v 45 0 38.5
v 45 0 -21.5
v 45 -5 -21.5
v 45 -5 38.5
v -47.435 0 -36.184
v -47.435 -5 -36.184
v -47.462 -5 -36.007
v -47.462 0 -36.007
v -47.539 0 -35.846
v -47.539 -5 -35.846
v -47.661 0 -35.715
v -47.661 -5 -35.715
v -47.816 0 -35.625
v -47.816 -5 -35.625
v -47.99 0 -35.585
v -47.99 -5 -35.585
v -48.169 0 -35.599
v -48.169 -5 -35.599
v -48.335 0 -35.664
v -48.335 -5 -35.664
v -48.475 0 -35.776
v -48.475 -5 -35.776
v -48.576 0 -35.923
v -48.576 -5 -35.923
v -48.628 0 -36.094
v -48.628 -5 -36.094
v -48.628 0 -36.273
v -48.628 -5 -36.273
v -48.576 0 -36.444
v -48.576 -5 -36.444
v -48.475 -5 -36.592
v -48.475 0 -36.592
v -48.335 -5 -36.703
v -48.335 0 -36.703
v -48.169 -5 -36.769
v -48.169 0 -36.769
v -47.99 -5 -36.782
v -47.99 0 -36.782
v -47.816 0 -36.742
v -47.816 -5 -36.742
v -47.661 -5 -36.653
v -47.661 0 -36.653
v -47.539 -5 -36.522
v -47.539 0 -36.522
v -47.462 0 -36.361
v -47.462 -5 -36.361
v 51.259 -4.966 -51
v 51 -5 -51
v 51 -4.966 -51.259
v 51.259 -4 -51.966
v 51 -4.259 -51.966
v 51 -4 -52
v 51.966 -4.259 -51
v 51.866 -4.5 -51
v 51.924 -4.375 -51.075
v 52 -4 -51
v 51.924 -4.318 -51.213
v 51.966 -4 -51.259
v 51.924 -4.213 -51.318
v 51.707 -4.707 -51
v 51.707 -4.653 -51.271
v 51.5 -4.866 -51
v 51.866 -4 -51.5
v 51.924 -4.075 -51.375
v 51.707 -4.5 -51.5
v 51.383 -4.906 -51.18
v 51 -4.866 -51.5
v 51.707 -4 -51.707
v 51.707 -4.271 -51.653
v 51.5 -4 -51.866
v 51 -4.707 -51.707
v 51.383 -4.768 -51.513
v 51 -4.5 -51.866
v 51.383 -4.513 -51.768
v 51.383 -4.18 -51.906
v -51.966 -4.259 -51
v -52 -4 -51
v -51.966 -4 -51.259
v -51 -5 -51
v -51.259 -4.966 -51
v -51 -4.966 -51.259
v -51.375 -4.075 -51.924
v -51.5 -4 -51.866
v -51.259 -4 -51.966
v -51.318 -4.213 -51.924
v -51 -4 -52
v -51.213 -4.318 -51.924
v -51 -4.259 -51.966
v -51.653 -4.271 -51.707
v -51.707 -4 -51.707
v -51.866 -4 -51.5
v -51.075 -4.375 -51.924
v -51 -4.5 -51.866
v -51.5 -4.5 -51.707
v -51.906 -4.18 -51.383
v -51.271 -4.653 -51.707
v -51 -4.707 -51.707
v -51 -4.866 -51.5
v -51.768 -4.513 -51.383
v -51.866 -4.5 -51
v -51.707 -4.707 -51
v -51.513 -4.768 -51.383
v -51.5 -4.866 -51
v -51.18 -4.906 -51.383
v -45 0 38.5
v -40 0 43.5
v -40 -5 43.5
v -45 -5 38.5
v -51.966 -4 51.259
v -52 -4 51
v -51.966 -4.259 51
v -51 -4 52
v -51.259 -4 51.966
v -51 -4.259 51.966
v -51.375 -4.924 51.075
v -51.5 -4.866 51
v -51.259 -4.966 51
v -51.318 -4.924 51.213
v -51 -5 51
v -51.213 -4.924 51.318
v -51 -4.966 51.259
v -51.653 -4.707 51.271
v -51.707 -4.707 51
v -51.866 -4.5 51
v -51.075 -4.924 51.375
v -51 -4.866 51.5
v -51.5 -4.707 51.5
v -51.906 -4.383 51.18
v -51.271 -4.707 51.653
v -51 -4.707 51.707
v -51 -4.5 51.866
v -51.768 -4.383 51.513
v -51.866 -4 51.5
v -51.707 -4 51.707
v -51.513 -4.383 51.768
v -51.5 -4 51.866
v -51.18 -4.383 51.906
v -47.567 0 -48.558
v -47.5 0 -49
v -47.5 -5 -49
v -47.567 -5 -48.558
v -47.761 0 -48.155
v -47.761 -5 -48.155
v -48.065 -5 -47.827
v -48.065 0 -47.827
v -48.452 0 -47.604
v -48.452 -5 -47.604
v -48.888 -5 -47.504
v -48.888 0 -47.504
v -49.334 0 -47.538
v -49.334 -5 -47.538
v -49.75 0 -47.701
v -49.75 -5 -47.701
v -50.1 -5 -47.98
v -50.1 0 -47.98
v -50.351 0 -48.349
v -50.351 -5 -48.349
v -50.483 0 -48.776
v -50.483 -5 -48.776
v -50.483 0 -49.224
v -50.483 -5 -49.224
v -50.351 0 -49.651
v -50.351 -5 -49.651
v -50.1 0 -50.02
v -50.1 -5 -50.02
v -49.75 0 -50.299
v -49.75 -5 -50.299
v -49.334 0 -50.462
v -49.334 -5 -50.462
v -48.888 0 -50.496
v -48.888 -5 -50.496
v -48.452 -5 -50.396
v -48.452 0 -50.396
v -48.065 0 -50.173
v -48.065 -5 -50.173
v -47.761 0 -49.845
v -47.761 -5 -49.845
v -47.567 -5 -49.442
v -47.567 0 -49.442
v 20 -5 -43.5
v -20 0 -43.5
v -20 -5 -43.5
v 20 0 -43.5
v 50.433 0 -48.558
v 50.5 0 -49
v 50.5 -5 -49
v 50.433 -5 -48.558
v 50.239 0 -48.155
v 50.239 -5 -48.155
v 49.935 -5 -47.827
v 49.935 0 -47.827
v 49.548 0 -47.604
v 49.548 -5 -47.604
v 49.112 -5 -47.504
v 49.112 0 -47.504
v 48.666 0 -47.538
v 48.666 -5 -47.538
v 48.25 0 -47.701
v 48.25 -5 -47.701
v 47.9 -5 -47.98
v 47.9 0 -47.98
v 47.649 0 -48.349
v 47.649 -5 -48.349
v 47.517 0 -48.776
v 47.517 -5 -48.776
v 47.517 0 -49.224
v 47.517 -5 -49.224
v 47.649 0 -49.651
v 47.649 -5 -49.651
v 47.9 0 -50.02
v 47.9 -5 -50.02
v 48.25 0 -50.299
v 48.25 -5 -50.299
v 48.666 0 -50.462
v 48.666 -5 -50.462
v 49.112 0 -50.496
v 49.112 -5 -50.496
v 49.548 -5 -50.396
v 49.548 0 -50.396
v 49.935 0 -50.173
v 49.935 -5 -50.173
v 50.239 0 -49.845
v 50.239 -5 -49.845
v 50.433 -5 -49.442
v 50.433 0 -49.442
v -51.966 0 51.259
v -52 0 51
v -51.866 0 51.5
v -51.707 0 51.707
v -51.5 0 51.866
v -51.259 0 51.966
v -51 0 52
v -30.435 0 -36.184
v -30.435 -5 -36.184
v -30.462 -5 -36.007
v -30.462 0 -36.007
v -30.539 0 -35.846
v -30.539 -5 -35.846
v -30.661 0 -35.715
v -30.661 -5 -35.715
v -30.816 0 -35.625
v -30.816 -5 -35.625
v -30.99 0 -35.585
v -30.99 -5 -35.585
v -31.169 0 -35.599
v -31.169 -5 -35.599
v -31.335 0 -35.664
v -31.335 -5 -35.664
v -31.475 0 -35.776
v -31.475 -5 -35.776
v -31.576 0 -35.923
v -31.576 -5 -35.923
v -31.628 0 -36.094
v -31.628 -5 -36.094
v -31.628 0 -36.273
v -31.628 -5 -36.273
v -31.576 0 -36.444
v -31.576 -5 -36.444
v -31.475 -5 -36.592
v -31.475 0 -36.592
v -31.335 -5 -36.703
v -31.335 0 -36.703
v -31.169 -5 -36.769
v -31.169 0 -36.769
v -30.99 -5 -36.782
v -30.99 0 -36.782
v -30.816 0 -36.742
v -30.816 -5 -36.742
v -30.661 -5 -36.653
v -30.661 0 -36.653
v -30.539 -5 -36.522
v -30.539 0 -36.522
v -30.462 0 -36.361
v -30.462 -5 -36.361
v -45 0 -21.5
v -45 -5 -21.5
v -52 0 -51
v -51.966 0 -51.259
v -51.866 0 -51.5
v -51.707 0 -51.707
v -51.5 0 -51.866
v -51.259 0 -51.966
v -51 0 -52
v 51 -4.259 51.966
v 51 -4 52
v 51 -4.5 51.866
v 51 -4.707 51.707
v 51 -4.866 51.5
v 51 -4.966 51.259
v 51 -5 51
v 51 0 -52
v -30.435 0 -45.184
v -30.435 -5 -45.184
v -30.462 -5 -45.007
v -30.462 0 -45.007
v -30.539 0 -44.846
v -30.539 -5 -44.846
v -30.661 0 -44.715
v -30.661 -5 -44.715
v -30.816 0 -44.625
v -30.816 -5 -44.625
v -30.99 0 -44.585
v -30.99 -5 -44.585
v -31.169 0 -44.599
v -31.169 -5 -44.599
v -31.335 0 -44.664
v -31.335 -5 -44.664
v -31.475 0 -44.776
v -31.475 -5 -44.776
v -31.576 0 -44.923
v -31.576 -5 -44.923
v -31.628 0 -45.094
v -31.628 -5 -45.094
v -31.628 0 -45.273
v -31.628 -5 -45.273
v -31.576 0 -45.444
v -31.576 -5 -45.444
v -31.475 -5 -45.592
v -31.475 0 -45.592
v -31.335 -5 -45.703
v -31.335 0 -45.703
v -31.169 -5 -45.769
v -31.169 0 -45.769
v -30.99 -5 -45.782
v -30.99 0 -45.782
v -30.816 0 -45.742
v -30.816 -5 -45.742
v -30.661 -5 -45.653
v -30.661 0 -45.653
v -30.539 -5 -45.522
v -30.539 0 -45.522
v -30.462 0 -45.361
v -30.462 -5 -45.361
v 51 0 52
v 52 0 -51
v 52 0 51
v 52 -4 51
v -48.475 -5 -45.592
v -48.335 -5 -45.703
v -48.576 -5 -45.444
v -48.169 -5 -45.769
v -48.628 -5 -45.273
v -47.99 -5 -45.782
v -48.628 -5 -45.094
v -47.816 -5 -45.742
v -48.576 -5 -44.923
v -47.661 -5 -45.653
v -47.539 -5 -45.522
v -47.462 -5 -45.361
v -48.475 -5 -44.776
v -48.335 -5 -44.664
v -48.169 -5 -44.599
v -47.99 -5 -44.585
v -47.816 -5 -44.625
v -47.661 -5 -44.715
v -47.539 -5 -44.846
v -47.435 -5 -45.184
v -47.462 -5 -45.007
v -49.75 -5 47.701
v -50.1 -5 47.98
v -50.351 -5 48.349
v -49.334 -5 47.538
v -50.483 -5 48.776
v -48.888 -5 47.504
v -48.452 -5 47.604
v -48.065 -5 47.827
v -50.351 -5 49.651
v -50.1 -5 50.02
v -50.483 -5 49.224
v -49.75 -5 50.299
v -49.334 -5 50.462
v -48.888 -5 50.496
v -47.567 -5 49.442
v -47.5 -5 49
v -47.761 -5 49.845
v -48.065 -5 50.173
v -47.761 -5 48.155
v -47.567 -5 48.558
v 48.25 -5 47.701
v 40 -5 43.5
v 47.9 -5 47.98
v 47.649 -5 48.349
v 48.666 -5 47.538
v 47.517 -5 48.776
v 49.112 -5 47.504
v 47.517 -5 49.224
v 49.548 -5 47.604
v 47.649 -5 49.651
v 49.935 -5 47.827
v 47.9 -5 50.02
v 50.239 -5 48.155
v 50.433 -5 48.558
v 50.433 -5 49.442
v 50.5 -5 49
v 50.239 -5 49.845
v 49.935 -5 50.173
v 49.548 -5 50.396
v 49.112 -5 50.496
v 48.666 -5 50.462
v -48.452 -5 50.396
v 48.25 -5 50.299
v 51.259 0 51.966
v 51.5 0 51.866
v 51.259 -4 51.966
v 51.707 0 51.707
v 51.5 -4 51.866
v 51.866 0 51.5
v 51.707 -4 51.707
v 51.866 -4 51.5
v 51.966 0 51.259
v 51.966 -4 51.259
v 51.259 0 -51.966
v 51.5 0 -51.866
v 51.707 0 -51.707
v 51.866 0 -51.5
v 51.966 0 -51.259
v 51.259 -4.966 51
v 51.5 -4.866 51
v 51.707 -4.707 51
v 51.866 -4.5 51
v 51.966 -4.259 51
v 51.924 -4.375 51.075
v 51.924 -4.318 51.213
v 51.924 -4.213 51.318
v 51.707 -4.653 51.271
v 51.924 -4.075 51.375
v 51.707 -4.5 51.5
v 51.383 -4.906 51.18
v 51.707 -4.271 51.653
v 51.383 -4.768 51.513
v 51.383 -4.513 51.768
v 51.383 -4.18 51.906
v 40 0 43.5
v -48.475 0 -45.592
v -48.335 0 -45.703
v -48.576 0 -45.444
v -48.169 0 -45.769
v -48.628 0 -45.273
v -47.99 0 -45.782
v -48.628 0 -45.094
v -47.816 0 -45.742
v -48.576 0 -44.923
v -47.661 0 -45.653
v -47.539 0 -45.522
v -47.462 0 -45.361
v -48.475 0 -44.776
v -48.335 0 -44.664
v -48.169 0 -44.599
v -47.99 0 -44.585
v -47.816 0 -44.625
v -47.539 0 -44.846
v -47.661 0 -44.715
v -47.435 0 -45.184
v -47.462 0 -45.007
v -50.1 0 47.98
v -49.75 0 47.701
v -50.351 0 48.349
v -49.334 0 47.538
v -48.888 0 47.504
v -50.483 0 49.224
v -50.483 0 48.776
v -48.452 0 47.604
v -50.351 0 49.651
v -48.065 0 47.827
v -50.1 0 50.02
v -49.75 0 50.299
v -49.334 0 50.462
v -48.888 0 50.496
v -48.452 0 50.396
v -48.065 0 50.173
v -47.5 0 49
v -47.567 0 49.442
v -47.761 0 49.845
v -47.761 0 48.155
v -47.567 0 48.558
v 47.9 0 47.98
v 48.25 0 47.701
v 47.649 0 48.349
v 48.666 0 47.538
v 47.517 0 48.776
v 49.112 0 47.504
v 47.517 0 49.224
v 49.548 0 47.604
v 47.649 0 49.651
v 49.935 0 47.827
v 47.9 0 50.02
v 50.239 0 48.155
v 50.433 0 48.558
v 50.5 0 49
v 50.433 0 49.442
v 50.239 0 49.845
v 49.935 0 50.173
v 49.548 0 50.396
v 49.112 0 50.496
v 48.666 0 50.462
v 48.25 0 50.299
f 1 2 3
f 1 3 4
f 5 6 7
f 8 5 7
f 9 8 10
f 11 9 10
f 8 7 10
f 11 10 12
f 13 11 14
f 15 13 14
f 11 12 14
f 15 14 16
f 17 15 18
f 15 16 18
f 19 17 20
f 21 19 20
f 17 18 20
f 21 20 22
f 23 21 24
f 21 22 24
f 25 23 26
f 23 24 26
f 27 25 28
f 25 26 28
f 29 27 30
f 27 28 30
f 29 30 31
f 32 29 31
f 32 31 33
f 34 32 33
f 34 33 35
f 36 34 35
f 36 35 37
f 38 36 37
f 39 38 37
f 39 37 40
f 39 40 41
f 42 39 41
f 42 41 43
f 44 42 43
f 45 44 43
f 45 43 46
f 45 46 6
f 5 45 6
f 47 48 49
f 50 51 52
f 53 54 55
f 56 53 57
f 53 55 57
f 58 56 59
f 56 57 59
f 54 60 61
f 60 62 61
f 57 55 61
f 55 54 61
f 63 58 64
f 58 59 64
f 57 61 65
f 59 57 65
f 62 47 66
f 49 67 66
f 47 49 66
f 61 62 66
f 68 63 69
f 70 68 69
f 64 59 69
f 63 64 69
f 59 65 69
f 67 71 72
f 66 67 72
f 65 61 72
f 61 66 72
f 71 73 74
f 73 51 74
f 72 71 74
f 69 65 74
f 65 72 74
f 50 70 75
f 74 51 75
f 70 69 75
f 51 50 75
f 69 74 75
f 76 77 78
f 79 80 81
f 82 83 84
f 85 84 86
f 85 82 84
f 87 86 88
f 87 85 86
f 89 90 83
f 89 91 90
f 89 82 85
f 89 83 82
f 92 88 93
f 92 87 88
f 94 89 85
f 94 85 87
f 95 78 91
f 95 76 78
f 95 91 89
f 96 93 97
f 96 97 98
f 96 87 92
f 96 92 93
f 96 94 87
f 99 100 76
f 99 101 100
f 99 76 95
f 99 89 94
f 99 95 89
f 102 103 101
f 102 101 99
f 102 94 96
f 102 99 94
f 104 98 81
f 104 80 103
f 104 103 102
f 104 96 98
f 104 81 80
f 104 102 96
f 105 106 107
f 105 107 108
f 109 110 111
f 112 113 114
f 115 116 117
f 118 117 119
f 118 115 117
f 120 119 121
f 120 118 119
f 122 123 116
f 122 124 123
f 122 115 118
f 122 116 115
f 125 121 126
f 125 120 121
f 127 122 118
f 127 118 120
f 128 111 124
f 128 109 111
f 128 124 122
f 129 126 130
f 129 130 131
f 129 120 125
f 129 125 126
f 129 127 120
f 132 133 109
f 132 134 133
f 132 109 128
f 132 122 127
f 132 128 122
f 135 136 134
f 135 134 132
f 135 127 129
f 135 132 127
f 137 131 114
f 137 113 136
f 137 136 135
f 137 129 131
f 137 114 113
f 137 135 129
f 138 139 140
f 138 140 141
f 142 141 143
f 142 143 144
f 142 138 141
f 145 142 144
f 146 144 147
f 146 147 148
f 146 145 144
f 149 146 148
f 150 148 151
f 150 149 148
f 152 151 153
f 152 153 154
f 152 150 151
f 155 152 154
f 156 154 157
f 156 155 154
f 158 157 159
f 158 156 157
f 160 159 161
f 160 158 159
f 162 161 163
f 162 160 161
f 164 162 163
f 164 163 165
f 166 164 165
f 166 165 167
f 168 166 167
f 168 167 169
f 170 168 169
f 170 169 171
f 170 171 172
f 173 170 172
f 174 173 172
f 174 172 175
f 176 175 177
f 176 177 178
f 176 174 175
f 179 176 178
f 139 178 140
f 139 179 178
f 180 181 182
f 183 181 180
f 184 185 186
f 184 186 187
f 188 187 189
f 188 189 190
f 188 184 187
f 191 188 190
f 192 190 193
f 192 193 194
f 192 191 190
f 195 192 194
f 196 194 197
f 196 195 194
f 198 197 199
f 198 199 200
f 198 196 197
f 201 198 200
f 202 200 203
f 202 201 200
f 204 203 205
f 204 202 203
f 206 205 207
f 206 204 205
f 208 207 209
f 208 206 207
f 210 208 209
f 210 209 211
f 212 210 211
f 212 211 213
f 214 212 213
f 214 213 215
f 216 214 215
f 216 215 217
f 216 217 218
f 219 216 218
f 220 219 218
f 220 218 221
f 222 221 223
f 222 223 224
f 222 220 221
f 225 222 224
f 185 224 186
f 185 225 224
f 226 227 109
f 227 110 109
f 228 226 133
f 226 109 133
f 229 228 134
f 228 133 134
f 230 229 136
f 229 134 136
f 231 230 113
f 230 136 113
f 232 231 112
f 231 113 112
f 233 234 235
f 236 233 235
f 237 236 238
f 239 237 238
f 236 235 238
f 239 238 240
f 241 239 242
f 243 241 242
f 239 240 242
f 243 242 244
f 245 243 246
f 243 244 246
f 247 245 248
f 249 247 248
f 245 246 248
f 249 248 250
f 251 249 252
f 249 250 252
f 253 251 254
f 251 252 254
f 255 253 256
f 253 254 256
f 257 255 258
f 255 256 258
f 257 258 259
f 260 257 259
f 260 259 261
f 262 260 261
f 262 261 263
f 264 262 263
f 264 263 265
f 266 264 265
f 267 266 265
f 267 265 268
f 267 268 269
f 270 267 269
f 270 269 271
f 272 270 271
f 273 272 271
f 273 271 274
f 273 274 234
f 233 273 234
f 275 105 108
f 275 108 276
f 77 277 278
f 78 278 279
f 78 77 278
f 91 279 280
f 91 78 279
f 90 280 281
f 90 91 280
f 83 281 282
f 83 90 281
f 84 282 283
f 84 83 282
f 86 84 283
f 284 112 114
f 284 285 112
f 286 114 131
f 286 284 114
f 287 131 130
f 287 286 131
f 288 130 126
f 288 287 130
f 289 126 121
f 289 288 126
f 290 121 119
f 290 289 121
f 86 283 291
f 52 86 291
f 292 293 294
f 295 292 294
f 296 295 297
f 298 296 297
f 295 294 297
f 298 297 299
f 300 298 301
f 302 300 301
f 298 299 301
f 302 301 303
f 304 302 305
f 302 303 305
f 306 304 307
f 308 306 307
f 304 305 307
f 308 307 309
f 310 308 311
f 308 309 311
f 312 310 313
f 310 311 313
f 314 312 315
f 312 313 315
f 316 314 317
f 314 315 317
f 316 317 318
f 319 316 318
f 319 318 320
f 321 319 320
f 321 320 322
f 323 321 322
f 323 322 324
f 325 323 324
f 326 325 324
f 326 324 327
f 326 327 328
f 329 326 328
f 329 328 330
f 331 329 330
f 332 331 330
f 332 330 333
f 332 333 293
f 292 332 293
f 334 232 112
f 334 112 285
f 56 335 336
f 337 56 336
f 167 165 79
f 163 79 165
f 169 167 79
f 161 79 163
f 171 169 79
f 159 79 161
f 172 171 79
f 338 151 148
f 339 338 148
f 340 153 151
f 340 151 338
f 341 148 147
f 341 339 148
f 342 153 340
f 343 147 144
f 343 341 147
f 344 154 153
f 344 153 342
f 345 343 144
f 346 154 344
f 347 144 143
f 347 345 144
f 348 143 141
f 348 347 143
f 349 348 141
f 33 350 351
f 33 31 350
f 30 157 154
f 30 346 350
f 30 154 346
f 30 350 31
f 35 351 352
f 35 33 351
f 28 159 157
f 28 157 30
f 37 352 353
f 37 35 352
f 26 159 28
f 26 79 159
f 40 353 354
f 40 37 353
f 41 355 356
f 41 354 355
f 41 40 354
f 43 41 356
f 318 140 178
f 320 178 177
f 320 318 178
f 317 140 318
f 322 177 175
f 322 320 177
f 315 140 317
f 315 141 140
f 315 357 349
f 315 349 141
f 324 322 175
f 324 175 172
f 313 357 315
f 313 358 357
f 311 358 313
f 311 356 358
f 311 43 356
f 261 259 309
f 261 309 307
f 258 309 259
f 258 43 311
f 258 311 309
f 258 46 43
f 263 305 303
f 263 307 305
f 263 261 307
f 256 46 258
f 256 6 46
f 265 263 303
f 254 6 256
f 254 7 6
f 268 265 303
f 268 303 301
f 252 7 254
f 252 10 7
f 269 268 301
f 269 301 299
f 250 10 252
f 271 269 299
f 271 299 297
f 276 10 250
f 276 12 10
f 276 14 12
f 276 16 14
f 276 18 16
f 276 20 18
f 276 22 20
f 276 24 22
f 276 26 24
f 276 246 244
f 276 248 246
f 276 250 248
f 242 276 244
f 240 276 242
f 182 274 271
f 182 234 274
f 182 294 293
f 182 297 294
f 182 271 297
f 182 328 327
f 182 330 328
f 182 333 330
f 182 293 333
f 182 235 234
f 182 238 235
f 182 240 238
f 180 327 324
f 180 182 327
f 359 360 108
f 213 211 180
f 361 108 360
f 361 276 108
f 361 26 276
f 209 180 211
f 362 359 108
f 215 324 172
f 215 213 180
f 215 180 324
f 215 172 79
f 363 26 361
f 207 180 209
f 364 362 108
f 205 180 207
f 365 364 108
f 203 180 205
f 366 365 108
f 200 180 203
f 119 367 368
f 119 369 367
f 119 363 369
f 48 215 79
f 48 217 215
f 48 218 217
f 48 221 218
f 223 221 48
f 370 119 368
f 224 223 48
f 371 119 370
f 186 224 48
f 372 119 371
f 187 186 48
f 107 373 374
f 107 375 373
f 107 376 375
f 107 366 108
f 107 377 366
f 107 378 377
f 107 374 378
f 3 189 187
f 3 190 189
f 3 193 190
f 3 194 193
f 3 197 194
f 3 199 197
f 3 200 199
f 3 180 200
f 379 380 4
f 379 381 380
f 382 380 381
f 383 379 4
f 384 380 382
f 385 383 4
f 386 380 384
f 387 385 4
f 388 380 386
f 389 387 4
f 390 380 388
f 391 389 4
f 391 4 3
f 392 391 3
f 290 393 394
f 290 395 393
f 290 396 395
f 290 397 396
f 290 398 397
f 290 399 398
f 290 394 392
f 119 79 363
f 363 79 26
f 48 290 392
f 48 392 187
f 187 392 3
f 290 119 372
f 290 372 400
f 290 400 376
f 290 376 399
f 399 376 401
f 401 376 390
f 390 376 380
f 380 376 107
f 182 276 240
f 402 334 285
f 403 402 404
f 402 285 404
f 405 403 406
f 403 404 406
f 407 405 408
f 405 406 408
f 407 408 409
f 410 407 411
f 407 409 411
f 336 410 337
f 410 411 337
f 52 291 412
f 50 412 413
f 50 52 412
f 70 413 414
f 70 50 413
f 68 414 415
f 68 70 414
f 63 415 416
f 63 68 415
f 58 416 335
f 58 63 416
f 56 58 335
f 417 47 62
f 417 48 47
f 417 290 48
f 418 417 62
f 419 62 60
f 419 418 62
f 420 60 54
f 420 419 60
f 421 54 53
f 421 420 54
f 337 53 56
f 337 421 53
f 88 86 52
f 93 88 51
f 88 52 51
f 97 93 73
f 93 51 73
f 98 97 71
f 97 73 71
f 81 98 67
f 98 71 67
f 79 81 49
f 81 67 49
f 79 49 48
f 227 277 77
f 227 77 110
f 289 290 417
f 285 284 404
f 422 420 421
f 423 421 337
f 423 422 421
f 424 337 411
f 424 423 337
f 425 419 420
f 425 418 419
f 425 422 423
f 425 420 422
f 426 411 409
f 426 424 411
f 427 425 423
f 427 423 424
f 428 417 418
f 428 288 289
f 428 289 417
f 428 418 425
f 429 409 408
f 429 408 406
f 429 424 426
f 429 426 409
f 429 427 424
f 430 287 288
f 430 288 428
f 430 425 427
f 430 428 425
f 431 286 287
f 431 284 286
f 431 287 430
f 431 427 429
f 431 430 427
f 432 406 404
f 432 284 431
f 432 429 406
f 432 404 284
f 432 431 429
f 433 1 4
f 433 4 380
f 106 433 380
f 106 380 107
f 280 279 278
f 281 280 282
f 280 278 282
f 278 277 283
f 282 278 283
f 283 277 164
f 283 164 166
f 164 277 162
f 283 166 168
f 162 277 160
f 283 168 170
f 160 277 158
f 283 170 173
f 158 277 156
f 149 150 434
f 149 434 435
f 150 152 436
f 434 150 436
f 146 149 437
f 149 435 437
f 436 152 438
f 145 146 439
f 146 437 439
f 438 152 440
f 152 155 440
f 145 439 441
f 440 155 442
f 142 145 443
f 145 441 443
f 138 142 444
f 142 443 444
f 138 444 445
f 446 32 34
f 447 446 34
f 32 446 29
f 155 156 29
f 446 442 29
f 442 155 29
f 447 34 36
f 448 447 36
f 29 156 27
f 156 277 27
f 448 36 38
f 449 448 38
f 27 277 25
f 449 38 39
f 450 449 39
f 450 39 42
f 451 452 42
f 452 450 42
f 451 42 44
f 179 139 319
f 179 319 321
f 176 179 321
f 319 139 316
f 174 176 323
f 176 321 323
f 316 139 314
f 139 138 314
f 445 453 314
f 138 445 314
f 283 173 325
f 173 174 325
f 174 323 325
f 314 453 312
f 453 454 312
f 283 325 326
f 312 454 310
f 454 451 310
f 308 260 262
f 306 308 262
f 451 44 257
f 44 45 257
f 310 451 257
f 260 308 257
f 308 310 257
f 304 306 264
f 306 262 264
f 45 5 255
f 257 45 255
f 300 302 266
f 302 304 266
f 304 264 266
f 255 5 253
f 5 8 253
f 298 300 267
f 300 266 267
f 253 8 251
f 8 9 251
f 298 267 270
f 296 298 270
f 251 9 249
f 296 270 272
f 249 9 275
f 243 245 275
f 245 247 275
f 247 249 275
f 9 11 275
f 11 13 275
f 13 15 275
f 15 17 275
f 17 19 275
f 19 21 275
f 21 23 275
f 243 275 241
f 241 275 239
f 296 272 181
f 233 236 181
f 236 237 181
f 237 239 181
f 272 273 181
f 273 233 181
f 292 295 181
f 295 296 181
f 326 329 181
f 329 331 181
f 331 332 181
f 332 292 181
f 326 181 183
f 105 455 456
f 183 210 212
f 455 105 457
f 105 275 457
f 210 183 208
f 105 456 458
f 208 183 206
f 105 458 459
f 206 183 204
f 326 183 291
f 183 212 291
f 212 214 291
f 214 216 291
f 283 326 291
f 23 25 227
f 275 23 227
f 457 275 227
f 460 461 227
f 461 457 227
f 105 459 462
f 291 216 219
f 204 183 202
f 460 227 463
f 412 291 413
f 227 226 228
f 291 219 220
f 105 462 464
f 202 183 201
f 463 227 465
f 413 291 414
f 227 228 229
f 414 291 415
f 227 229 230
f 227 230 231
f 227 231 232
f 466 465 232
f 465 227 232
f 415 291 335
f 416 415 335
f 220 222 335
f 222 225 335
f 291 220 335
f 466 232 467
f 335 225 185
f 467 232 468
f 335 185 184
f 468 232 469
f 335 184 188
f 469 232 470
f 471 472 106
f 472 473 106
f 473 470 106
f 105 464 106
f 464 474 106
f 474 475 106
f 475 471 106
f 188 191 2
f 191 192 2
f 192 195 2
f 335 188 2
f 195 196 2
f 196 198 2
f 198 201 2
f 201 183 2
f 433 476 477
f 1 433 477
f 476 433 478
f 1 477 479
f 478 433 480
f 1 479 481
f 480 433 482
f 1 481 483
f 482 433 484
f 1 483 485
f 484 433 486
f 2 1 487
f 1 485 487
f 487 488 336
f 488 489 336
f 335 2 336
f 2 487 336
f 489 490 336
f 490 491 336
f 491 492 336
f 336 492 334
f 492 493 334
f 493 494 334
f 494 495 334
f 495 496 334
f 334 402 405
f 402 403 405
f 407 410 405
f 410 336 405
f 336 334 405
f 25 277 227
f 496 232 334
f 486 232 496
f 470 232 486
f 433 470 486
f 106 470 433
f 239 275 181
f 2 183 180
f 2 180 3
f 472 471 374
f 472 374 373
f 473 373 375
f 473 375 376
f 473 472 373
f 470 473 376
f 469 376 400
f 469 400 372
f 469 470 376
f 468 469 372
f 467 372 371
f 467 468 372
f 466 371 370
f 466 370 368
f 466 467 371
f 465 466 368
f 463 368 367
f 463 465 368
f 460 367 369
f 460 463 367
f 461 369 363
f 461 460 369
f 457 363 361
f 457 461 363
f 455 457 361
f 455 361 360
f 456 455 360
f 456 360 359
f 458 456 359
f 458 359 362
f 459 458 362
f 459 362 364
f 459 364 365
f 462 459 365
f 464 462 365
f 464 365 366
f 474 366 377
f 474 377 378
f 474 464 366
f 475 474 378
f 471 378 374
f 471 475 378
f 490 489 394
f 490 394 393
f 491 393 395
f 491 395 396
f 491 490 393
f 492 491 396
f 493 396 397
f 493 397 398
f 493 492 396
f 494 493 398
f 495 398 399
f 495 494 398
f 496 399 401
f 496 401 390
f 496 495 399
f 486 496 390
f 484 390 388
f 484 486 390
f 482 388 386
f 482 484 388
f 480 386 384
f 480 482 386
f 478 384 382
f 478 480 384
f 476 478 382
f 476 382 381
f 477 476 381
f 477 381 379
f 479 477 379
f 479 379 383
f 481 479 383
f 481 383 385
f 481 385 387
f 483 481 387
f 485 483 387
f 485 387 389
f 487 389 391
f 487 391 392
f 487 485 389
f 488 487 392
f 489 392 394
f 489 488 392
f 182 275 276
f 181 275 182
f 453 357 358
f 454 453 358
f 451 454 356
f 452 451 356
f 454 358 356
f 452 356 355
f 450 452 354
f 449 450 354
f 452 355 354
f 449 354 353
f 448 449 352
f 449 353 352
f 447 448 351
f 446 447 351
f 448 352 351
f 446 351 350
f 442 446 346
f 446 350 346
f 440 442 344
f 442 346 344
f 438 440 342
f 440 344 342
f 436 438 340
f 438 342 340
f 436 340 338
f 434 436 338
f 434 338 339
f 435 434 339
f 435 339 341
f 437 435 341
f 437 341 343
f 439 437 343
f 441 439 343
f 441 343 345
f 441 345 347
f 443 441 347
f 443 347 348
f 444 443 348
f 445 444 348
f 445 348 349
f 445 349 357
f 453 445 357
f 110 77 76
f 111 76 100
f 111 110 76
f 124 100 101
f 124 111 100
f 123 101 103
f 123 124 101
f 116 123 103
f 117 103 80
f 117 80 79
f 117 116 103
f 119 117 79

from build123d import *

# Parameters (mm, degrees)
F0_W      = 104
F0_H      = 104
F0_R      = 1.5
F2_DEPTH  = 5
F2_FACE_W = 104
F2_FACE_H = 104
F2_FACE_R = 1.5
F3_DEPTH  = 25
F4_R      = 1
F5_R      = 0.6
F6_DEPTH  = 25


with BuildPart() as f2:
    # F0 (on Front) → F2 (new body)
    with BuildSketch(Plane.XZ):
        Rectangle(F0_W, F0_H)
        with Locations((-49, -49)):
            Circle(F0_R, mode=Mode.SUBTRACT)
        with Locations((49, -49)):
            Circle(F0_R, mode=Mode.SUBTRACT)
        with Locations((-49, 49)):
            Circle(F0_R, mode=Mode.SUBTRACT)
        with Locations((49, 49)):
            Circle(F0_R, mode=Mode.SUBTRACT)
    extrude(amount=F2_DEPTH)

    # F1 (on Front) + F2_face (on face) → F3 (cut)
    with BuildSketch(Plane.XZ):
        Polygon((40, 43.5), (-40, 43.5), (-45, 38.5), (-45, -21.5), (-20, -43.5), (20, -43.5), (45, -21.5), (45, 38.5), align=None)
    with BuildSketch(Plane.XZ.offset(5)):
        Rectangle(F2_FACE_W, F2_FACE_H)
        with Locations((-49, -49)):
            Circle(F2_FACE_R, mode=Mode.SUBTRACT)
        with Locations((49, -49)):
            Circle(F2_FACE_R, mode=Mode.SUBTRACT)
        with Locations((-49, 49)):
            Circle(F2_FACE_R, mode=Mode.SUBTRACT)
        with Locations((49, 49)):
            Circle(F2_FACE_R, mode=Mode.SUBTRACT)
    extrude(amount=F3_DEPTH, mode=Mode.SUBTRACT)

    # F4
    f4_edges = [f2.edges().sort_by_distance(p)[0] for p in [
        (-52, -2.5, 52),
        (-52, -5, 0),
        (0, -5, 52),
        (-52, -2.5, -52),
        (0, -5, -52),
        (52, -5, 0),
        (52, -2.5, 52),
        (52, -2.5, -52),
    ]]
    fillet(f4_edges, radius=F4_R)

    # F5 (on face) → F6 (cut)
    with BuildSketch(Plane.XZ.offset(5)):
        with Locations((-48.035103, -36.183678)):
            Circle(F5_R)
        with Locations((-48.035103, -45.183678)):
            Circle(F5_R)
        with Locations((-31.035103, -36.183678)):
            Circle(F5_R)
        with Locations((-31.035103, -45.183678)):
            Circle(F5_R)
    extrude(amount=-F6_DEPTH, mode=Mode.SUBTRACT)


solid = f2.part
